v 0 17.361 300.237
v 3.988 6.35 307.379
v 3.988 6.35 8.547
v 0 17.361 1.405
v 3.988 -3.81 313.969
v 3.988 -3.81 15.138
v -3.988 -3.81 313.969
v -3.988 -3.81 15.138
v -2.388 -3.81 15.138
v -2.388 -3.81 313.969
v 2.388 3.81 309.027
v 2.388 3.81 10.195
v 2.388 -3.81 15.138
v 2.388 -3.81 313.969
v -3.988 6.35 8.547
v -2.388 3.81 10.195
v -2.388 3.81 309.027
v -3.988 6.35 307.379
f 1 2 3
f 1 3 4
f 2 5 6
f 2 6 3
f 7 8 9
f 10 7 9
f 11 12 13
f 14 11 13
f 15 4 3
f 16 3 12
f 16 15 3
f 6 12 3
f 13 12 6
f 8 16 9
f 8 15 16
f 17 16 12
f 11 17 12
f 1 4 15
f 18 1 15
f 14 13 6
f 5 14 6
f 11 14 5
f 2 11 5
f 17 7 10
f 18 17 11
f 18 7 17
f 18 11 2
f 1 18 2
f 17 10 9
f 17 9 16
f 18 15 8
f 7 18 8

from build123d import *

# Parameters (mm, degrees)
BOSS_EXTRUDE1_DEPTH = 313.9694


with BuildPart() as part:
    # Sketch1 → Boss-Extrude1 (new body)
    with BuildSketch(Plane.XY):
        Polygon((-2.3876, 3.81), (2.3876, 3.81), (2.3876, -3.81), (3.9878, -3.81), (3.9878, 6.35), (0, 17.3609), (-3.9878, 6.35), (-3.9878, -3.81), (-2.3876, -3.81), align=None)
    extrude(amount=BOSS_EXTRUDE1_DEPTH)

    # Split1
    split(bisect_by=Plane(origin=(0, 142.217371243, 219.246784501), x_dir=(0, 0.8389556253011311, -0.5441998334946346), z_dir=(0, 0.5441998334946346, 0.8389556253011311)), keep=Keep.BOTTOM)

    # Split2
    split(bisect_by=Plane(origin=(0, 5.782993207, 8.915244702), x_dir=(0, -0.8389556253011311, 0.5441998334946346), z_dir=(0, -0.5441998334946346, -0.8389556253011311)), keep=Keep.BOTTOM)


solid = part.part
